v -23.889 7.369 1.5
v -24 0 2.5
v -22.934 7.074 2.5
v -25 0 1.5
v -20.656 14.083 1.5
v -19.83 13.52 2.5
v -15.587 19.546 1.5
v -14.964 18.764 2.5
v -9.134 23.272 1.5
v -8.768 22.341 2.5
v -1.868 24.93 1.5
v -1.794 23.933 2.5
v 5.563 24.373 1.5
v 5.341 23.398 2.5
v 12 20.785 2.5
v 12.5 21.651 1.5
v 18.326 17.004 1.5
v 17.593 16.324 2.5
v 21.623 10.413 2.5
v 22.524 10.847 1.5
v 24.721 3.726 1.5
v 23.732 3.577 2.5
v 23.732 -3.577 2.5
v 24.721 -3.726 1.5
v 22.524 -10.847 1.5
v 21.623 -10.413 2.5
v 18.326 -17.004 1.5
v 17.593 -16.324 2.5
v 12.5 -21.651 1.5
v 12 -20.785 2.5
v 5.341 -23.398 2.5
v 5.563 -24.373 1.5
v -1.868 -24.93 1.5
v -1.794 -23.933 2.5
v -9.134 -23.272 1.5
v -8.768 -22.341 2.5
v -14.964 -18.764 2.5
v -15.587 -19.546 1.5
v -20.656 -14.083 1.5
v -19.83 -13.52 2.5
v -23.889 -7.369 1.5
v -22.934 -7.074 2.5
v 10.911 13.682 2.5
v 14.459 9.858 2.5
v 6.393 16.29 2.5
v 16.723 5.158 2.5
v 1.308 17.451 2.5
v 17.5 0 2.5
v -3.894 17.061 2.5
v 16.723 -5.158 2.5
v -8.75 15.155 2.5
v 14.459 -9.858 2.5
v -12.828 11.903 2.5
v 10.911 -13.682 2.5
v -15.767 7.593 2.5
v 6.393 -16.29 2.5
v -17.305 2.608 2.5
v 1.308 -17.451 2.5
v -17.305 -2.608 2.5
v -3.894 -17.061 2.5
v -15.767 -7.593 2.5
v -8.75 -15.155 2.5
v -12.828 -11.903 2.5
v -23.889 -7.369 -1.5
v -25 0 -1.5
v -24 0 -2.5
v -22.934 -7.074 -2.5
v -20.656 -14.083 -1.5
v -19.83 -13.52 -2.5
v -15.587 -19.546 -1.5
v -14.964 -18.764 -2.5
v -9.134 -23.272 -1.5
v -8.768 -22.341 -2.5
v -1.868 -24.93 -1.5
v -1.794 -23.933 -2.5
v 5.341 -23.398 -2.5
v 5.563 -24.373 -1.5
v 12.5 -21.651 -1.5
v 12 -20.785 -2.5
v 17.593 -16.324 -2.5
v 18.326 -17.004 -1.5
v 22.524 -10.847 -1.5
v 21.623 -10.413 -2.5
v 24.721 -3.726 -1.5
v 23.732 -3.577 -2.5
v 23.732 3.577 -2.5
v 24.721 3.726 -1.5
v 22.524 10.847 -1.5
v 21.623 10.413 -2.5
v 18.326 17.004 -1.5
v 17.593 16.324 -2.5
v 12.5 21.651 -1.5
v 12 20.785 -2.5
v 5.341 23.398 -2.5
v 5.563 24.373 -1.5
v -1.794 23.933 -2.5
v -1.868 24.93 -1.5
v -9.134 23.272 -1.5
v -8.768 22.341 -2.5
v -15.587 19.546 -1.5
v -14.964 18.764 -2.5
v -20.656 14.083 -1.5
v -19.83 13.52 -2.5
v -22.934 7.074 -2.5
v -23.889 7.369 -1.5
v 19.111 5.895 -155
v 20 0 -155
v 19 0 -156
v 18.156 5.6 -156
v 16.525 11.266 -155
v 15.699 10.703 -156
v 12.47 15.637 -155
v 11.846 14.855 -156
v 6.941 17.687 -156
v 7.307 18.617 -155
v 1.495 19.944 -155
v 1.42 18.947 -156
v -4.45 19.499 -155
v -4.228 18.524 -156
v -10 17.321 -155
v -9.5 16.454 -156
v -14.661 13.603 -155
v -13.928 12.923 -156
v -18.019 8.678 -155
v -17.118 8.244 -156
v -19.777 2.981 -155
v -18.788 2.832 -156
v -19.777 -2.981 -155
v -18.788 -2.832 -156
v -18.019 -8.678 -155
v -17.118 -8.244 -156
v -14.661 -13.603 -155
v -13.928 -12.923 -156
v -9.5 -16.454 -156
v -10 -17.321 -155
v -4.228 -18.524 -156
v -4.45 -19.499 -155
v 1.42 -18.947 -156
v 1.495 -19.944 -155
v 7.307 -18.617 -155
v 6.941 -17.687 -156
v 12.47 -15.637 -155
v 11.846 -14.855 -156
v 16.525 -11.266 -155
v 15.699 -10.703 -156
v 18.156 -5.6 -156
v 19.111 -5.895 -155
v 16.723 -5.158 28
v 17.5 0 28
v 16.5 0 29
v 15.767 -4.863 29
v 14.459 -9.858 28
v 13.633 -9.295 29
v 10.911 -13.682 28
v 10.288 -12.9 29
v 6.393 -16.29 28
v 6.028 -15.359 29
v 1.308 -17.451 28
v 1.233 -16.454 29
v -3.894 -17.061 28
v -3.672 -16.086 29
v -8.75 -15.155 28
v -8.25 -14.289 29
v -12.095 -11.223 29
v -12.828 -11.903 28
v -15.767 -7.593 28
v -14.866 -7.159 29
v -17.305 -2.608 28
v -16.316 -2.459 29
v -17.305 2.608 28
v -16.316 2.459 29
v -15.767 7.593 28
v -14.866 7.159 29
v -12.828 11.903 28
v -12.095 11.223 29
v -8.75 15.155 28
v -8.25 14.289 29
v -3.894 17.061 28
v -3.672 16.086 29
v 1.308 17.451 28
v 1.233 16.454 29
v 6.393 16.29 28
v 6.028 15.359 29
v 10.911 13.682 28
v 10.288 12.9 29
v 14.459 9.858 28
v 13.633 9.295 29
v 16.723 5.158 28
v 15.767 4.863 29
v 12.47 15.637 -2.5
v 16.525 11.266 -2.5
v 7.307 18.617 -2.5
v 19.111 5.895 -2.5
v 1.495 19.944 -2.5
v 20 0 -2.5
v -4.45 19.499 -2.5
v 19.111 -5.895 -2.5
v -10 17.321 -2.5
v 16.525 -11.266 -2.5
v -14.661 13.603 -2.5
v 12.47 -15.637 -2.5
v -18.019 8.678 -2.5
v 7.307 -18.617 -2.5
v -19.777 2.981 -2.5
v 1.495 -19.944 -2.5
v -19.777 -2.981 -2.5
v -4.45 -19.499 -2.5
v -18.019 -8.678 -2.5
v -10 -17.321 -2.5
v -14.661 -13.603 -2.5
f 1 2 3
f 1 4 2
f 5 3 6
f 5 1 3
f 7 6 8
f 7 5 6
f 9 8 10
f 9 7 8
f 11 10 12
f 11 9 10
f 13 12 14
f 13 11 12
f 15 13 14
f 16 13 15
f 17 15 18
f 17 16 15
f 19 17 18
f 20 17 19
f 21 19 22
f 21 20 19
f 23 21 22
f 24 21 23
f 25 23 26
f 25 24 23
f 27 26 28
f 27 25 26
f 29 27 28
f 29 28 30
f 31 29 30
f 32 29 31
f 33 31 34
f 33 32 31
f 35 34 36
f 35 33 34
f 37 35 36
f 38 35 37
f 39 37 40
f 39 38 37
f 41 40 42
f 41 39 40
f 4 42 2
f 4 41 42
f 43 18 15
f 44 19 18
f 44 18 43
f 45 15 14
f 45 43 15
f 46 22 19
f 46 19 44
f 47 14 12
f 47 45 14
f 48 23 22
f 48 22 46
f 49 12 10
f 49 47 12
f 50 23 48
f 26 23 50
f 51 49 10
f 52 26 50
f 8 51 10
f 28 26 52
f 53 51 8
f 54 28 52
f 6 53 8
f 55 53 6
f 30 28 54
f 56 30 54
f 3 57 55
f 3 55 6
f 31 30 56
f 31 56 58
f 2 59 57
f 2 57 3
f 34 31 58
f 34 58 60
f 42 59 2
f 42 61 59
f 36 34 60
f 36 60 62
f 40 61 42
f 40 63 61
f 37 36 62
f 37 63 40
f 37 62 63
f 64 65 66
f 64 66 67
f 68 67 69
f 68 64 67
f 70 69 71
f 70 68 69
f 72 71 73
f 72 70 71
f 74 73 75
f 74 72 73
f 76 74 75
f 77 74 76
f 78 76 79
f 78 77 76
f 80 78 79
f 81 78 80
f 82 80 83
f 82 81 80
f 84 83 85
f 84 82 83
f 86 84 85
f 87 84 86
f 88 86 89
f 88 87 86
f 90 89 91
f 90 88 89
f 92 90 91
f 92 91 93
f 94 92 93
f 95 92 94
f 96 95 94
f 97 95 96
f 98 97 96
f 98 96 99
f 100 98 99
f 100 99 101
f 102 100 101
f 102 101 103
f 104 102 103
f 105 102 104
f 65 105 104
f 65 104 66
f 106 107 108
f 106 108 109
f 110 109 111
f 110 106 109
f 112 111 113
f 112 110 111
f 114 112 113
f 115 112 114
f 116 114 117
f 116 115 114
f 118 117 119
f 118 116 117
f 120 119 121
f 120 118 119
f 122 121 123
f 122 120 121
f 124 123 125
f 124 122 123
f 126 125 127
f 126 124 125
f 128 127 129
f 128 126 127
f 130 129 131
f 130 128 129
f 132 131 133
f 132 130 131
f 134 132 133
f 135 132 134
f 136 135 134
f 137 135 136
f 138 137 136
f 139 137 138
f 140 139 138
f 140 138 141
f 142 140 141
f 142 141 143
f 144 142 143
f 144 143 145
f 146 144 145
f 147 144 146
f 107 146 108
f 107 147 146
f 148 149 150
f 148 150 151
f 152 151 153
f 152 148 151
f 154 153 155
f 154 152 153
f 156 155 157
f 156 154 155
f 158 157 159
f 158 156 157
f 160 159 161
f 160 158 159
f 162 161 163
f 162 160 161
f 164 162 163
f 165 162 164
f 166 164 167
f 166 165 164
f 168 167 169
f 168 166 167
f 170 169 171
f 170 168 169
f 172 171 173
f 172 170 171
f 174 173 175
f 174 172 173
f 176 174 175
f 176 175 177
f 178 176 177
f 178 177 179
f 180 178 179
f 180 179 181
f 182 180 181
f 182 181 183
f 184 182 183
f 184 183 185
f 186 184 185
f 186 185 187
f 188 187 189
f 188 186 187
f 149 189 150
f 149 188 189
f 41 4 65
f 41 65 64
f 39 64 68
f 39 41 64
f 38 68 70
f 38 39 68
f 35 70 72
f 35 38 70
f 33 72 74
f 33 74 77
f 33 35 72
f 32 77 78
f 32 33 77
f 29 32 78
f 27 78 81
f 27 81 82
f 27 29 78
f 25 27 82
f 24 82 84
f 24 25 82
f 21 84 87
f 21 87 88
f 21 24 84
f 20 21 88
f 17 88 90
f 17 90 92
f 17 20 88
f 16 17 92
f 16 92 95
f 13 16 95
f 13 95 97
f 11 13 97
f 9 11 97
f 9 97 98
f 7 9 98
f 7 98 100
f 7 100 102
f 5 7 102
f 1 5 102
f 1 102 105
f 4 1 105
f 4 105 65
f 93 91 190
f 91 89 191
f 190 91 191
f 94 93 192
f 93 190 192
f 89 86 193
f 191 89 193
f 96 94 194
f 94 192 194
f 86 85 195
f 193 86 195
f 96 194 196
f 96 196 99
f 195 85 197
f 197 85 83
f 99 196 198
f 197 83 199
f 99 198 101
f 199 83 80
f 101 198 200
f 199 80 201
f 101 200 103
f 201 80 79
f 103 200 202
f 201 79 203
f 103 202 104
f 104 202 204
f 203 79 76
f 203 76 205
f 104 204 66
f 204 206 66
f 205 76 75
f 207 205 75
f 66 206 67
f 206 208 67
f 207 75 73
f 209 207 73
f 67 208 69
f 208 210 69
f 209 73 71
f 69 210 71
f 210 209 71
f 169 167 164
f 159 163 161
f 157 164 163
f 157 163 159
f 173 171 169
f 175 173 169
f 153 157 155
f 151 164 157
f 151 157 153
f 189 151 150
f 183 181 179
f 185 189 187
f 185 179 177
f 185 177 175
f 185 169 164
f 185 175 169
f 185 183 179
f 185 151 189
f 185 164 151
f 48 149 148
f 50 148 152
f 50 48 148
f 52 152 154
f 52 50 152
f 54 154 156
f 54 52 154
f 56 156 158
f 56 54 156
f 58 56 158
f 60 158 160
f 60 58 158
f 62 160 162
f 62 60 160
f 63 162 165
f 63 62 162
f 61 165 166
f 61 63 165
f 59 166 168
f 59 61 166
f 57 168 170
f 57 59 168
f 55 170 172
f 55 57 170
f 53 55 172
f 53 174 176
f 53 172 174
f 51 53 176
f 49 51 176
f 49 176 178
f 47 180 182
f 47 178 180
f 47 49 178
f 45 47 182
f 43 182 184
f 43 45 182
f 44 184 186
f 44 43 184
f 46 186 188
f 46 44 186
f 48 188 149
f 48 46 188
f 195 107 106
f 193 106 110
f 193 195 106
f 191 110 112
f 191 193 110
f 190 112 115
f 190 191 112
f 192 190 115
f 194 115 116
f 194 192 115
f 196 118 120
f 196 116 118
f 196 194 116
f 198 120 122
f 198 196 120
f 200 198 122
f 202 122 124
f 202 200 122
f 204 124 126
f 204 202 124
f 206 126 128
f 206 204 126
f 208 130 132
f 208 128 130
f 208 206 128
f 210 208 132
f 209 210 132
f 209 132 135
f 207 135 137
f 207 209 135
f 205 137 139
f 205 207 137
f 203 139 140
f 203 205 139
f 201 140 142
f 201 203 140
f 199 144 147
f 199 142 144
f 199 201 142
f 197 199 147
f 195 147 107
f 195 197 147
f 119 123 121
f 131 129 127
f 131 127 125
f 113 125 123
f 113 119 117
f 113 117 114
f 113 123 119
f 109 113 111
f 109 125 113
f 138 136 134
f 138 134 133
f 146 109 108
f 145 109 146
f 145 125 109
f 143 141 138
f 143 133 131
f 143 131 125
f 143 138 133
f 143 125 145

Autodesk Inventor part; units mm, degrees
ref_plane "YZ Plane" through (0, 0, 0) normal (1, 0, 0) x (0, 1, 0)
ref_plane "XZ Plane" through (0, 0, 0) normal (0, 1, 0) x (-1, 0, 0)
ref_plane "XY Plane" through (0, 0, 0) normal (0, 0, 1) x (1, 0, 0)
sketch "Esboço1" plane through (0, 0, 0) normal (0, 0, 1) x (-1, 0, 0)
  circle A0 centre (0, 0) radius 25
  dimension "d0" = 50
extrude "Extrusão1" add sketch "Esboço1" along normal mid plane 5
sketch "Esboço2" plane through (0, 0, 0) normal (0, 0, -1) x (1, 0, 0)
  circle A0 centre (0, 0) radius 20
  dimension "d3" = 40
extrude "Extrusão2" add sketch "Esboço2" along normal blind 156
sketch "Esboço3" plane through (0, 0, 0) normal (0, 0, 1) x (1, 0, 0)
  circle A0 centre (0, 0) radius 17.5
  dimension "d6" = 35
extrude "Extrusão3" add sketch "Esboço3" along normal blind 29
chamfer "Chanfro1" distance 1 angle 45 1 edges at (-20, 0, -156)
chamfer "Chanfro2" distance 1 angle 45 3 edges at (25, 0, -2.5) (25, 0, 2.5) (-17.5, 0, 29)
properties material "Liga de aço"
